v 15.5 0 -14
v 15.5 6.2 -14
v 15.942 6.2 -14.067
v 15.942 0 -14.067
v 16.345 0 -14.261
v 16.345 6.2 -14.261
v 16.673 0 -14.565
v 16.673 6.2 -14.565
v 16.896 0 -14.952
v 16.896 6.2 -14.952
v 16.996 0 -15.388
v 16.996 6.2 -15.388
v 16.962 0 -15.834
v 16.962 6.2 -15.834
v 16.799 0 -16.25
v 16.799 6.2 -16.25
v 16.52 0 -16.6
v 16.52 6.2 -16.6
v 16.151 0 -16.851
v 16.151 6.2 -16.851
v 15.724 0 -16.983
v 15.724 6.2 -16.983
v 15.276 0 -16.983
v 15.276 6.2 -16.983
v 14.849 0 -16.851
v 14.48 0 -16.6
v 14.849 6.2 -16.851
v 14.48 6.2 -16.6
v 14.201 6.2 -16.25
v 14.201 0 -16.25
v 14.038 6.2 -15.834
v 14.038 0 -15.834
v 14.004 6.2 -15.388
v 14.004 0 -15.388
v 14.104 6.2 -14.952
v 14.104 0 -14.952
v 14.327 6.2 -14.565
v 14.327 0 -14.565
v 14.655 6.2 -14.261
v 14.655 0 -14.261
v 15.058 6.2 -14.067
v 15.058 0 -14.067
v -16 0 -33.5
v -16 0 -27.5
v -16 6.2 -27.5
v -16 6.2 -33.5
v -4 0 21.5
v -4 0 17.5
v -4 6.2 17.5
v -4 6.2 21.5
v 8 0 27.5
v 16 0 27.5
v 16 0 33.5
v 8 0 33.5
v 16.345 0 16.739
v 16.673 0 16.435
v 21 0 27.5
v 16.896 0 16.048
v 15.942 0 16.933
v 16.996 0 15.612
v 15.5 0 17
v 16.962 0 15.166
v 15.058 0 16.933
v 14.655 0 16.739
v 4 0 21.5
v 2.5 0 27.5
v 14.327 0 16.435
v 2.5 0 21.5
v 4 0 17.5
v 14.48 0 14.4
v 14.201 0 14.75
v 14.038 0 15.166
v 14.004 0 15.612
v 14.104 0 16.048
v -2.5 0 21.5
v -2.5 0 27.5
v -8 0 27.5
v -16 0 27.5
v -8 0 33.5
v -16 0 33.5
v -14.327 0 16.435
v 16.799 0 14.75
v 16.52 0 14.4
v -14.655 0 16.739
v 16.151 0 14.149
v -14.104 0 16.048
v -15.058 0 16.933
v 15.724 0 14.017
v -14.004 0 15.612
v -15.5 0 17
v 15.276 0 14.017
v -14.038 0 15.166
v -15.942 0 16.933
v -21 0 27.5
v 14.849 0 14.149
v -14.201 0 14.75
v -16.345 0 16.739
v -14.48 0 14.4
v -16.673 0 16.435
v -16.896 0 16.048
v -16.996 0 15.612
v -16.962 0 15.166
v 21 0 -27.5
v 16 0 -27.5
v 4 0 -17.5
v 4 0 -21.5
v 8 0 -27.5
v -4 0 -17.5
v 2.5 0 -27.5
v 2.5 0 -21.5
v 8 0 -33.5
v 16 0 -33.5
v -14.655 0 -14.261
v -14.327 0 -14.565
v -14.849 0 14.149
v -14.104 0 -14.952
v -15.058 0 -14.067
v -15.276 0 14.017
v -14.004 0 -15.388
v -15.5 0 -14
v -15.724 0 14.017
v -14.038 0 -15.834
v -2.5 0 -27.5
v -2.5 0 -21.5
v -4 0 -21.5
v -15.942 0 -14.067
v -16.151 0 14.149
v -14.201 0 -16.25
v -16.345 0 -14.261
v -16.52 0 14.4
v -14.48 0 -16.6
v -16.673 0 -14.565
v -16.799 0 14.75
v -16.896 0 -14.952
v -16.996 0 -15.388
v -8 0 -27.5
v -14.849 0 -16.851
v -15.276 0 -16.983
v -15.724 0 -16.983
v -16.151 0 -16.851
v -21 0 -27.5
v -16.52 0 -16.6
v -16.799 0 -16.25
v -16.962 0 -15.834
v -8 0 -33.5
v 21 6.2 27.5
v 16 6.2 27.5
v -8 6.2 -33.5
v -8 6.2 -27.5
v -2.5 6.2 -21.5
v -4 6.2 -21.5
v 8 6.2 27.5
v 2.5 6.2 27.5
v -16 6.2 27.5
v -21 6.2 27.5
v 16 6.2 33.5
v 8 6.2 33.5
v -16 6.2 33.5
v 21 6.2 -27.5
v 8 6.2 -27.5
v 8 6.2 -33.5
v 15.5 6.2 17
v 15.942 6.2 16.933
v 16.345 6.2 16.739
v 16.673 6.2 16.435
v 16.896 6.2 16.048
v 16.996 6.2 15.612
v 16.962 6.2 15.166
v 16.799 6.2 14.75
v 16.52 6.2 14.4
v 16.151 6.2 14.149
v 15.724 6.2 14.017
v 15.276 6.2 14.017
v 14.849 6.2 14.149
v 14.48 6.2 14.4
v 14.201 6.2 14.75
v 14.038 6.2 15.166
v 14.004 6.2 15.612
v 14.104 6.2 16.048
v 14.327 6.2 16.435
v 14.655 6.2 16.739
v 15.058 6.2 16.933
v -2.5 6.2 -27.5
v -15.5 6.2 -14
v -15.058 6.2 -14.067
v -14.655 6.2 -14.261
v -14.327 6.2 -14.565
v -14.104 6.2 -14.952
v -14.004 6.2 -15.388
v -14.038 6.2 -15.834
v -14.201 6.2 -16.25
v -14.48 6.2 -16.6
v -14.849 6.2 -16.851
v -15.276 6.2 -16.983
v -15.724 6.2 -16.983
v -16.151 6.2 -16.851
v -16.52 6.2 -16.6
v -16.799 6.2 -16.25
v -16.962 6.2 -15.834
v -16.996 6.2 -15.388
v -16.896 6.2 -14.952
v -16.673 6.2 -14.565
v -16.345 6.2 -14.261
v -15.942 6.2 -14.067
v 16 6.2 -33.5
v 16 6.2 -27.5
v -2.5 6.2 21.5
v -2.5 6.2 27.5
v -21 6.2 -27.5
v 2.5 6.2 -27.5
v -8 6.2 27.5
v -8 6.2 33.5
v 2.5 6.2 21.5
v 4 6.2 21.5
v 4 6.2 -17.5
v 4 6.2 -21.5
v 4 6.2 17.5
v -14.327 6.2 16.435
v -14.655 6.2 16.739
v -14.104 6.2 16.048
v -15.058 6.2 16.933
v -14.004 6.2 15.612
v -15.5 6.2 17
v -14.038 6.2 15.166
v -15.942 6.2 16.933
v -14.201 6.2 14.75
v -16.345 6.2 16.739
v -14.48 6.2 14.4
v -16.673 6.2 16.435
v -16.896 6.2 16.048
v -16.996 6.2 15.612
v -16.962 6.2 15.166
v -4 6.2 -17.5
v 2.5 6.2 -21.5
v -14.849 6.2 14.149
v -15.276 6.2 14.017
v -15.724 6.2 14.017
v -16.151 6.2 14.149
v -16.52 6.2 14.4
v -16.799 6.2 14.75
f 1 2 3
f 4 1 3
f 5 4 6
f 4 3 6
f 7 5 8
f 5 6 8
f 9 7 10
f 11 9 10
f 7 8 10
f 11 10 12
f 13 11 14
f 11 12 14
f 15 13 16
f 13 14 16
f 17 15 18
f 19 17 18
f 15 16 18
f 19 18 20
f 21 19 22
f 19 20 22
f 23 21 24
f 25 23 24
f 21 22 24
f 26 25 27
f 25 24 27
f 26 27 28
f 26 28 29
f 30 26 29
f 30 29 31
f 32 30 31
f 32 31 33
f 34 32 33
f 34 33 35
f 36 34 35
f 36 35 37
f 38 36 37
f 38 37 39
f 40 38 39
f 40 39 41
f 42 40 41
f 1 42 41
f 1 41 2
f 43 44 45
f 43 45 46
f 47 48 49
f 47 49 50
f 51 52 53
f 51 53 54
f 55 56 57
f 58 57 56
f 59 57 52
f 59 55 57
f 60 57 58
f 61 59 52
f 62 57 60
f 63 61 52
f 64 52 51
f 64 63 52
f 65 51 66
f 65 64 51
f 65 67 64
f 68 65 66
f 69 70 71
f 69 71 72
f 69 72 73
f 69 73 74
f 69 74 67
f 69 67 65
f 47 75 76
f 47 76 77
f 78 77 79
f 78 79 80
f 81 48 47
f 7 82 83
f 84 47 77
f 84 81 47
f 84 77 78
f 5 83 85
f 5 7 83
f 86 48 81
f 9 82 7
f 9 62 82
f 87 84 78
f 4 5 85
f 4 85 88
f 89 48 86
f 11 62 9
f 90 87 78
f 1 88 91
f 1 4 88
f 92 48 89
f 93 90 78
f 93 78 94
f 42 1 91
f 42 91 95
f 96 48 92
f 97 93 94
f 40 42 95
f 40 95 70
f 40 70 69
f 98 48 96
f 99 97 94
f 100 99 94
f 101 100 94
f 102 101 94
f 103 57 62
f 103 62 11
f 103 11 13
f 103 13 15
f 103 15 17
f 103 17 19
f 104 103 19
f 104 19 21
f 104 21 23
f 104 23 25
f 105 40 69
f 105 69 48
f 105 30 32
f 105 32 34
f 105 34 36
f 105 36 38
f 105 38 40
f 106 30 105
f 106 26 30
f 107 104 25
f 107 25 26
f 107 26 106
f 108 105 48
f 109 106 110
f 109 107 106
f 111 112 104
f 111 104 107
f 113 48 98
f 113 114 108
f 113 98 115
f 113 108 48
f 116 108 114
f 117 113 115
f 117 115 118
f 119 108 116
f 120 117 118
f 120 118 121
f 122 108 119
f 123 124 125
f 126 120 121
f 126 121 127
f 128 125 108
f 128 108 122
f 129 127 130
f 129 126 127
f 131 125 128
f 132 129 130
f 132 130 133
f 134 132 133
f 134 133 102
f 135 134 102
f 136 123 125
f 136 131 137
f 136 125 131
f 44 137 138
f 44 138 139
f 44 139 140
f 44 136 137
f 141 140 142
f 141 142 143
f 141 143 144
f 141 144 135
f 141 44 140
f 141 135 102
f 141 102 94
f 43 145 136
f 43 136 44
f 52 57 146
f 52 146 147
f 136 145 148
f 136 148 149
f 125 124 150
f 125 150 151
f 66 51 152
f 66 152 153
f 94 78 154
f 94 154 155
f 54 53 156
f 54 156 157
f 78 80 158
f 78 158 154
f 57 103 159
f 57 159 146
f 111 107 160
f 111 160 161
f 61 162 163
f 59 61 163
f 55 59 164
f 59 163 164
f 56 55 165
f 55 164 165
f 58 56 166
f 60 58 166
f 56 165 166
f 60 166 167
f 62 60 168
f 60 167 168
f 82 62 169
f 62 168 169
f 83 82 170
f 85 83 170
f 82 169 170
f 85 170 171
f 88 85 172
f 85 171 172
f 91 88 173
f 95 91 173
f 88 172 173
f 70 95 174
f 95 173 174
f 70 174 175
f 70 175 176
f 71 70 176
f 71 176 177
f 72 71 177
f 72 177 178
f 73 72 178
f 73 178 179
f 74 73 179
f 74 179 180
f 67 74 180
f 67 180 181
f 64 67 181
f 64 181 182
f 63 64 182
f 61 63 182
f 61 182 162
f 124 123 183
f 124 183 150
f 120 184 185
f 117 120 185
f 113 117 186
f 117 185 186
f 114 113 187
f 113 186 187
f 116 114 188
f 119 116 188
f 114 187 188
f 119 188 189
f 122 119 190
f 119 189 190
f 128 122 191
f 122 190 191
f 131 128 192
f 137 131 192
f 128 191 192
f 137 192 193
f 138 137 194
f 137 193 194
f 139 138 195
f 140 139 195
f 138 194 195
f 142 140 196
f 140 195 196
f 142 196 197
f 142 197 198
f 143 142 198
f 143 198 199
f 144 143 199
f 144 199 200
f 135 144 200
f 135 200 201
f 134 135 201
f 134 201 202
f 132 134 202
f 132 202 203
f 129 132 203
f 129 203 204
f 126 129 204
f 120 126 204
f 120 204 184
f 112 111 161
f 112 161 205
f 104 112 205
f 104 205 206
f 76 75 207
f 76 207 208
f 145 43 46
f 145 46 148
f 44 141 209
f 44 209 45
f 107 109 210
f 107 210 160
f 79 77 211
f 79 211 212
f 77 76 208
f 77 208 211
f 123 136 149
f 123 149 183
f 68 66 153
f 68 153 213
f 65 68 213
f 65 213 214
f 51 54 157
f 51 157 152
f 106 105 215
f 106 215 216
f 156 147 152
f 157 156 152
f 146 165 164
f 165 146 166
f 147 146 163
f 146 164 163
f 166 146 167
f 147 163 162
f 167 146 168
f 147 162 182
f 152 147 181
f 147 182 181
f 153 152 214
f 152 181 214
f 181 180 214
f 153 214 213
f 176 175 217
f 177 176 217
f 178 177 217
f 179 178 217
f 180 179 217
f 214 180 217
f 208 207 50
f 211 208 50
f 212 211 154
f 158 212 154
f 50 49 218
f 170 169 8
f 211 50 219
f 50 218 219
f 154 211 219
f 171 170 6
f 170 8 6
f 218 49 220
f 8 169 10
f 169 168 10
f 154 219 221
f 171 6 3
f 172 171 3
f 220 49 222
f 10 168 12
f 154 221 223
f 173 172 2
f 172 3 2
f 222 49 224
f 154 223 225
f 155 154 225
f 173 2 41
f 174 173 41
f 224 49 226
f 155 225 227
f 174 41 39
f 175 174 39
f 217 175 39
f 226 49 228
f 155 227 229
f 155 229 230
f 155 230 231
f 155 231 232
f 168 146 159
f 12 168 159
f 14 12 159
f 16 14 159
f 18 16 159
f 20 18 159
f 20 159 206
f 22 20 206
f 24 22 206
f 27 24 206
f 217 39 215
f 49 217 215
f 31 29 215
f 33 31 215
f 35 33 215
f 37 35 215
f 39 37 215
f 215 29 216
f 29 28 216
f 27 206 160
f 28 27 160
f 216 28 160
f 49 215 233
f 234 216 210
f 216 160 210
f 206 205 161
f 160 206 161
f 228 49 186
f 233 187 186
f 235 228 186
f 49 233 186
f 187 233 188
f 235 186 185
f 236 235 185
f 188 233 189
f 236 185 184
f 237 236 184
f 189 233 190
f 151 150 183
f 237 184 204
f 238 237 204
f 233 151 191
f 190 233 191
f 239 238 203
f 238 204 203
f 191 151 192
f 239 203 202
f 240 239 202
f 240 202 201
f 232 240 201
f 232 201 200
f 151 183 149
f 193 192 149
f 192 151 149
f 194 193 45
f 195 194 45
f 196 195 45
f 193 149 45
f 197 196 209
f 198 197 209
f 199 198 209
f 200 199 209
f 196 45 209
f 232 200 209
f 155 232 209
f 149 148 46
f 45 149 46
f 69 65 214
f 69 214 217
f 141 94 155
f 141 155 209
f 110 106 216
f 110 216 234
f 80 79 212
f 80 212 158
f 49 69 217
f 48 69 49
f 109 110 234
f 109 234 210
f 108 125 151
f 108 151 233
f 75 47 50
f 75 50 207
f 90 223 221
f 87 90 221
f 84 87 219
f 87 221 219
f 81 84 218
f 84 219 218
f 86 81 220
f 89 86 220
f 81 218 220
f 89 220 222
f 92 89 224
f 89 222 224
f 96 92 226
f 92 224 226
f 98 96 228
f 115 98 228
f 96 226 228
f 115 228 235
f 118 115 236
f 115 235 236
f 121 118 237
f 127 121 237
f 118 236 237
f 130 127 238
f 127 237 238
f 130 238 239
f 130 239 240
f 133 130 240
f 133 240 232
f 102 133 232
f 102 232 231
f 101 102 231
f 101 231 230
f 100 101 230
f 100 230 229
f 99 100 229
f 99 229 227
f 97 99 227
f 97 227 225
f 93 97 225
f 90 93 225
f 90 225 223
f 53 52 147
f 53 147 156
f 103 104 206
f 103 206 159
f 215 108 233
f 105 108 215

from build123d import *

# Parameters (mm, degrees)
BOSS_EXTRUDE1_DEPTH = 6.2
CUT_EXTRUDE1_REACH  = 42.021
SKETCH2_R           = 1.5


with BuildPart() as part:
    # Sketch1 → Boss-Extrude1 (new body)
    with BuildSketch(Plane(origin=(0, 0, 0), x_dir=(1, 0, 0), z_dir=(0, 1, 0))):
        Polygon((-21, 27.5), (-16, 27.5), (-16, 33.5), (-8, 33.5), (-8, 27.5), (-2.5, 27.5), (-2.5, 21.5), (-4, 21.5), (-4, 17.5), (4, 17.5), (4, 21.5), (2.5, 21.5), (2.5, 27.5), (8, 27.5), (8, 33.5), (16, 33.5), (16, 27.5), (21, 27.5), (21, -27.5), (16, -27.5), (16, -33.5), (8, -33.5), (8, -27.5), (2.5, -27.5), (2.5, -21.5), (4, -21.5), (4, -17.5), (-4, -17.5), (-4, -21.5), (-2.5, -21.5), (-2.5, -27.5), (-8, -27.5), (-8, -33.5), (-16, -33.5), (-16, -27.5), (-21, -27.5), align=None)
    extrude(amount=BOSS_EXTRUDE1_DEPTH)

    # Sketch2 → Cut-Extrude1 (cut, up to next)
    with BuildSketch(Plane(origin=(0, 6.2, 0), x_dir=(1, 0, 0), z_dir=(0, 1, 0)), mode=Mode.PRIVATE) as cut_extrude1_sk1:
        with Locations(Location((15.5, -15.5, 0), (0, 0, 270))):
            Circle(SKETCH2_R)
    cut_extrude1_tool1 = extrude(cut_extrude1_sk1.sketch, amount=-CUT_EXTRUDE1_REACH, mode=Mode.PRIVATE) & part.part
    # Sketch2 → Cut-Extrude1 (cut, up to next)
    with BuildSketch(Plane(origin=(0, 6.2, 0), x_dir=(1, 0, 0), z_dir=(0, 1, 0)), mode=Mode.PRIVATE) as cut_extrude1_sk2:
        with Locations(Location((-15.5, -15.5, 0), (0, 0, 270))):
            Circle(SKETCH2_R)
    cut_extrude1_tool2 = extrude(cut_extrude1_sk2.sketch, amount=-CUT_EXTRUDE1_REACH, mode=Mode.PRIVATE) & part.part
    # Sketch2 → Cut-Extrude1 (cut, up to next)
    with BuildSketch(Plane(origin=(0, 6.2, 0), x_dir=(1, 0, 0), z_dir=(0, 1, 0)), mode=Mode.PRIVATE) as cut_extrude1_sk3:
        with Locations(Location((-15.5, 15.5, 0), (0, 0, 270))):
            Circle(SKETCH2_R)
    cut_extrude1_tool3 = extrude(cut_extrude1_sk3.sketch, amount=-CUT_EXTRUDE1_REACH, mode=Mode.PRIVATE) & part.part
    # Sketch2 → Cut-Extrude1 (cut, up to next)
    with BuildSketch(Plane(origin=(0, 6.2, 0), x_dir=(1, 0, 0), z_dir=(0, 1, 0)), mode=Mode.PRIVATE) as cut_extrude1_sk4:
        with Locations(Location((15.5, 15.5, 0), (0, 0, 270))):
            Circle(SKETCH2_R)
    cut_extrude1_tool4 = extrude(cut_extrude1_sk4.sketch, amount=-CUT_EXTRUDE1_REACH, mode=Mode.PRIVATE) & part.part
    add(cut_extrude1_tool1.solids().sort_by_distance((15.5, 6.2, 15.5))[0], mode=Mode.SUBTRACT)
    add(cut_extrude1_tool2.solids().sort_by_distance((-15.5, 6.2, 15.5))[0], mode=Mode.SUBTRACT)
    add(cut_extrude1_tool3.solids().sort_by_distance((-15.5, 6.2, -15.5))[0], mode=Mode.SUBTRACT)
    add(cut_extrude1_tool4.solids().sort_by_distance((15.5, 6.2, -15.5))[0], mode=Mode.SUBTRACT)


solid = part.part
